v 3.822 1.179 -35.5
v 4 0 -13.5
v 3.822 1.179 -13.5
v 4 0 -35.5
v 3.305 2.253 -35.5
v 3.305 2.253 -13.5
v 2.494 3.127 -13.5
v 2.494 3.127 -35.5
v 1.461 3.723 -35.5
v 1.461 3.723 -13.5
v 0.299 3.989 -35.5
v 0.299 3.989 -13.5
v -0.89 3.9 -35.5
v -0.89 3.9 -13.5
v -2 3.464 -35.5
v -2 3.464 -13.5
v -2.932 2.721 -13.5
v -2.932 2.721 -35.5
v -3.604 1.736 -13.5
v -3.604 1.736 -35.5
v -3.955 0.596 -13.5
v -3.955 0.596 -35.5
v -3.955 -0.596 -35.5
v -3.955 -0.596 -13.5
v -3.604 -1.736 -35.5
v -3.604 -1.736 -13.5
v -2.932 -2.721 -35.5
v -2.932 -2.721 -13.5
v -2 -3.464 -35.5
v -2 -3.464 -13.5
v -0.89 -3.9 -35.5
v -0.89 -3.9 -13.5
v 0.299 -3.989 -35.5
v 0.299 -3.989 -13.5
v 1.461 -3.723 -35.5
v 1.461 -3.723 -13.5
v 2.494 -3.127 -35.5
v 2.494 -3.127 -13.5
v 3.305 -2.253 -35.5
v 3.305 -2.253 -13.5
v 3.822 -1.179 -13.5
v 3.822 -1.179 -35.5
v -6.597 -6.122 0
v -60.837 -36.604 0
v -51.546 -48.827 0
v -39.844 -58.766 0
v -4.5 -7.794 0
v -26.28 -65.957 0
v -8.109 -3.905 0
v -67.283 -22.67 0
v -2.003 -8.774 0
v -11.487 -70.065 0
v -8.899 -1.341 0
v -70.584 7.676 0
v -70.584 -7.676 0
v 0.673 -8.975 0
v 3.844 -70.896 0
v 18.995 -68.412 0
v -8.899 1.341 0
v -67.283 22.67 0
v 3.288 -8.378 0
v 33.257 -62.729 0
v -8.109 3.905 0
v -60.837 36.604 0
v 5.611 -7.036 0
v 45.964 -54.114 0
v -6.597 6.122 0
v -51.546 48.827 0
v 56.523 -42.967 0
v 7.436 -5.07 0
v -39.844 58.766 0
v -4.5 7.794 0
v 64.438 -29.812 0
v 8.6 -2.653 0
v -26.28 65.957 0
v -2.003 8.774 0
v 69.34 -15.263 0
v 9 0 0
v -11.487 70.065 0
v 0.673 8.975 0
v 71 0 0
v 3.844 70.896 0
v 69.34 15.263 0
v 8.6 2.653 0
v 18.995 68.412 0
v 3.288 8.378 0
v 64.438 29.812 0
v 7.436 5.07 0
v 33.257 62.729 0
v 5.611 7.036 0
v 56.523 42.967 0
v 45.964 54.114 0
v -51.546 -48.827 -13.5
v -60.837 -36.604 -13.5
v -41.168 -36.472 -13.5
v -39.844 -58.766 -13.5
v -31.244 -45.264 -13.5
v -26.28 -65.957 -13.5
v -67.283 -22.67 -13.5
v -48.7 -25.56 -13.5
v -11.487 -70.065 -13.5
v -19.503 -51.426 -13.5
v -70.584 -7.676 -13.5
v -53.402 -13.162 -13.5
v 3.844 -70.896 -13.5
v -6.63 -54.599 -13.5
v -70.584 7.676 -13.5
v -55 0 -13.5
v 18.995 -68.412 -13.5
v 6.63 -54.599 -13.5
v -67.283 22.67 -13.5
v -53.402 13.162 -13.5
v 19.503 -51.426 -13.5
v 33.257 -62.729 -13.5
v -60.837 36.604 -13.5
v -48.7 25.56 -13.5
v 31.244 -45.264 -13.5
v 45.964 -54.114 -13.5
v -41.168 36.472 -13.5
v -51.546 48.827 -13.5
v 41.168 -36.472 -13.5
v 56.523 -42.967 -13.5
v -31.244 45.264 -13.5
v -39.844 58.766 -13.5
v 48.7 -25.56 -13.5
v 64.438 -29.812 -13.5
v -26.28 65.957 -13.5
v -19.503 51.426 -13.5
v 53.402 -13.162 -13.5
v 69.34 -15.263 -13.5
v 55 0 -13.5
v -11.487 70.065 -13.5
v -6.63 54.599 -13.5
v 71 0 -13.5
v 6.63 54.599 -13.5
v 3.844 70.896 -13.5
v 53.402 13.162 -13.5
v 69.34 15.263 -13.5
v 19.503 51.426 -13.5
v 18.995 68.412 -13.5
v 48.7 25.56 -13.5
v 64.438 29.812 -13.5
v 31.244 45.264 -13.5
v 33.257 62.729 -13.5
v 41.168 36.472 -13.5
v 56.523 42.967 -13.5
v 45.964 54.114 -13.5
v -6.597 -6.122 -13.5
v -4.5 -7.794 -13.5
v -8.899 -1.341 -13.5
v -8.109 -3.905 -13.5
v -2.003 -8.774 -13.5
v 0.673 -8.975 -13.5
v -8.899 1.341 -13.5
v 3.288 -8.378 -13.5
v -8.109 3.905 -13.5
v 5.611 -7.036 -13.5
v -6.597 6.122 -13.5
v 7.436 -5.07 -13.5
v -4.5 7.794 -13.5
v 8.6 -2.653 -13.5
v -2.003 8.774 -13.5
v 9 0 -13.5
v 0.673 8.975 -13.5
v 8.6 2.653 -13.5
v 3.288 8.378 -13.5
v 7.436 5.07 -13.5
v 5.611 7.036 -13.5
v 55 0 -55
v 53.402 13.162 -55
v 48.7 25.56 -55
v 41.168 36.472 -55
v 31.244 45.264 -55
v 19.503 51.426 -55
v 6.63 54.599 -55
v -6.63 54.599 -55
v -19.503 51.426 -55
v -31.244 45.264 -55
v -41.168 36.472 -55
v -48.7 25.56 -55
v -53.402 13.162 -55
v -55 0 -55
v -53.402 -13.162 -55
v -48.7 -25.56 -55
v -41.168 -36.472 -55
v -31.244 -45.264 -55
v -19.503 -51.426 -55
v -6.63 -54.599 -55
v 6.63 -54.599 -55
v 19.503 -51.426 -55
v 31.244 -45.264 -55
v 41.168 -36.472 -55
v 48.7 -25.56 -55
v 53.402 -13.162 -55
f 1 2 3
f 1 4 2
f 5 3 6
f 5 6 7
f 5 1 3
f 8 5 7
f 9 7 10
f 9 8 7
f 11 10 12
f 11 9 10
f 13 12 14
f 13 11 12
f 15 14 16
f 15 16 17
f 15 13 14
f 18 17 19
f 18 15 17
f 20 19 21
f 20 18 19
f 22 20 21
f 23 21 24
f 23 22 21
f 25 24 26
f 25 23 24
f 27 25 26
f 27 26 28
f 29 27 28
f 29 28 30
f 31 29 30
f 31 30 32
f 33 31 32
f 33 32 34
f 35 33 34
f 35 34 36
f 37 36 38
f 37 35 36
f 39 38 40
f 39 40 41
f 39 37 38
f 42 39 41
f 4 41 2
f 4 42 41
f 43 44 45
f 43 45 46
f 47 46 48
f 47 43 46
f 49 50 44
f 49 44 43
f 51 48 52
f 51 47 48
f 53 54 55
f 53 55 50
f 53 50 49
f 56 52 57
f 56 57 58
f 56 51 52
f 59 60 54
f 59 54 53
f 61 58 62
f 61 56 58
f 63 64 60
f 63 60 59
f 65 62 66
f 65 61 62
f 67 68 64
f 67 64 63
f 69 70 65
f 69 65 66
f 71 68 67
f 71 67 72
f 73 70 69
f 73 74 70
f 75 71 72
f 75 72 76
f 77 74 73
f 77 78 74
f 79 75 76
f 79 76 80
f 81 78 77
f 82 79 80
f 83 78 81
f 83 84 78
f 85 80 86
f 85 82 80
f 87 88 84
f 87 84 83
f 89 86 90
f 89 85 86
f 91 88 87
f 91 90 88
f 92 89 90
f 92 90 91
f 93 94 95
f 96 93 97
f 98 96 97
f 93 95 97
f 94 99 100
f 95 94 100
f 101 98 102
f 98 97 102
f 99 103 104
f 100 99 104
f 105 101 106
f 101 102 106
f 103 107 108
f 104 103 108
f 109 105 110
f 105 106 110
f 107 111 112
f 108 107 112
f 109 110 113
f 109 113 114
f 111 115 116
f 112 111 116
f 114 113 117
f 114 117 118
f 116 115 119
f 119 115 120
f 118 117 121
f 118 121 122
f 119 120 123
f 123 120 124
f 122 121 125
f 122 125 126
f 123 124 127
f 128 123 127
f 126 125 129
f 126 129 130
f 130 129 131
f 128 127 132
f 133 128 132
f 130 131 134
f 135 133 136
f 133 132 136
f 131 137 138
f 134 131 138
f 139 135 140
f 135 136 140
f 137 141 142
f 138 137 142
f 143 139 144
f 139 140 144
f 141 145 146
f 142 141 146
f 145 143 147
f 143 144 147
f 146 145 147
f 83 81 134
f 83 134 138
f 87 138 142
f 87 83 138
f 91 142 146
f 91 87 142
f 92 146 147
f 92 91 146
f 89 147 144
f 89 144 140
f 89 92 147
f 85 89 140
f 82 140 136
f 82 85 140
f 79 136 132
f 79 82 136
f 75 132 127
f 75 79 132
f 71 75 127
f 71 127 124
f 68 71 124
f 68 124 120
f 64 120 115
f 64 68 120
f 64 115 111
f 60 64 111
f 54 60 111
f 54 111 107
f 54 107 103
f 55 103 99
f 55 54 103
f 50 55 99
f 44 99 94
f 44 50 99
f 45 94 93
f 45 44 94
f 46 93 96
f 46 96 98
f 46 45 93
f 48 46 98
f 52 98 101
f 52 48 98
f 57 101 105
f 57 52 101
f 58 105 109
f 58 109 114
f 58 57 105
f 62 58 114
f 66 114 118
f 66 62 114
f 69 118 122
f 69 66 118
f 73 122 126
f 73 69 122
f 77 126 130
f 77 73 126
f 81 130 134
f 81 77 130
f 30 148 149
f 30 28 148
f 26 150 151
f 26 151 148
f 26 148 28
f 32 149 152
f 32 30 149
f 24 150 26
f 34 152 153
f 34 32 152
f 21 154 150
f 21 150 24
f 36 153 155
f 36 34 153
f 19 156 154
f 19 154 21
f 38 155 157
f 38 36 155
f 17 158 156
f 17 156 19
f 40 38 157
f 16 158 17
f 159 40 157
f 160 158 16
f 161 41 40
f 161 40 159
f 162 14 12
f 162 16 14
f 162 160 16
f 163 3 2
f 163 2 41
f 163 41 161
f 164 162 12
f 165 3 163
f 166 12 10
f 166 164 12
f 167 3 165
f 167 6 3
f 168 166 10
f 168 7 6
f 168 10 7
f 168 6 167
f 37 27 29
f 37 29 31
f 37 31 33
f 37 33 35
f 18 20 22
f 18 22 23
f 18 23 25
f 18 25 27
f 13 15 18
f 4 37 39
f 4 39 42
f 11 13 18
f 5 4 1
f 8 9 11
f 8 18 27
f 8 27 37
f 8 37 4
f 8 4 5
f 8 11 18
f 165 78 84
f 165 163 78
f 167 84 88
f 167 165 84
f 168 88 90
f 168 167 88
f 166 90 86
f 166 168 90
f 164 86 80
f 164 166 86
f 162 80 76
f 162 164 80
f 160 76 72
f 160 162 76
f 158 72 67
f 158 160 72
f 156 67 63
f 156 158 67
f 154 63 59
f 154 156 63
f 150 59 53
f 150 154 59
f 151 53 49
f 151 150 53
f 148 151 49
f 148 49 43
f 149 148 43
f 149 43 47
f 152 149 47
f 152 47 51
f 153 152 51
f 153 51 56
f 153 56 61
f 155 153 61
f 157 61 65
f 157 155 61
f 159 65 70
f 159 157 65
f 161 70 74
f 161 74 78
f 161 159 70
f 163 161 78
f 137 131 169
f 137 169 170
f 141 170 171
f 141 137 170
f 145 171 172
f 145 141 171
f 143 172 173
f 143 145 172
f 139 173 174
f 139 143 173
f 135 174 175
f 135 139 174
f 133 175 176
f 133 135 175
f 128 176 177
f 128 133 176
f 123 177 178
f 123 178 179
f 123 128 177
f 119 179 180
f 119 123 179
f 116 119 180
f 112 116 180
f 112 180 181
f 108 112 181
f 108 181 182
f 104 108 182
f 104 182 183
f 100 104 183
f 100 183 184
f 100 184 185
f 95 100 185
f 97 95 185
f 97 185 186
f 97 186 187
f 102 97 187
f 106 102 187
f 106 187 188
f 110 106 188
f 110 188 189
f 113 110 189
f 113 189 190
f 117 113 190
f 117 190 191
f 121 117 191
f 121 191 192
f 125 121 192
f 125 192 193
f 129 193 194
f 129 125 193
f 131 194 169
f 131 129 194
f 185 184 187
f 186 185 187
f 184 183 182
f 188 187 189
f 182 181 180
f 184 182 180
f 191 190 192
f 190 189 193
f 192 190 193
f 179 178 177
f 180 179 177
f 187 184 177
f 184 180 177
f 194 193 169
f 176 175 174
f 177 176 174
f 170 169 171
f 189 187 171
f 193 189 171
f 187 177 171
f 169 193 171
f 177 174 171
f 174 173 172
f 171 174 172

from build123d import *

# Parameters (mm, degrees)
SKETCH128_R   = 71
SKETCH128_R_2 = 9
PAD050_DEPTH  = 13.5
SKETCH131_R   = 55
PAD052_DEPTH  = 55


with BuildPart() as part:
    # Sketch128 → Pad050 (new body)
    with BuildSketch(Plane.XY):
        Circle(SKETCH128_R)
        Circle(SKETCH128_R_2, mode=Mode.SUBTRACT)
    extrude(amount=-PAD050_DEPTH)

    # Sketch131 → Pad052 (join)
    with BuildSketch(Plane.XY):
        Circle(SKETCH131_R)
    extrude(amount=-PAD052_DEPTH)

    # Sketch130 → Groove (revolve, cut)
    with BuildSketch(Plane.XZ):
        Polygon((0, 0), (9, 0), (9, -13.5), (4, -13.5), (4, -35.5), (0, -35.5), align=None)
    revolve(axis=Axis((0, 0, 0), (0, 0, 1)), mode=Mode.SUBTRACT)


solid = part.part
